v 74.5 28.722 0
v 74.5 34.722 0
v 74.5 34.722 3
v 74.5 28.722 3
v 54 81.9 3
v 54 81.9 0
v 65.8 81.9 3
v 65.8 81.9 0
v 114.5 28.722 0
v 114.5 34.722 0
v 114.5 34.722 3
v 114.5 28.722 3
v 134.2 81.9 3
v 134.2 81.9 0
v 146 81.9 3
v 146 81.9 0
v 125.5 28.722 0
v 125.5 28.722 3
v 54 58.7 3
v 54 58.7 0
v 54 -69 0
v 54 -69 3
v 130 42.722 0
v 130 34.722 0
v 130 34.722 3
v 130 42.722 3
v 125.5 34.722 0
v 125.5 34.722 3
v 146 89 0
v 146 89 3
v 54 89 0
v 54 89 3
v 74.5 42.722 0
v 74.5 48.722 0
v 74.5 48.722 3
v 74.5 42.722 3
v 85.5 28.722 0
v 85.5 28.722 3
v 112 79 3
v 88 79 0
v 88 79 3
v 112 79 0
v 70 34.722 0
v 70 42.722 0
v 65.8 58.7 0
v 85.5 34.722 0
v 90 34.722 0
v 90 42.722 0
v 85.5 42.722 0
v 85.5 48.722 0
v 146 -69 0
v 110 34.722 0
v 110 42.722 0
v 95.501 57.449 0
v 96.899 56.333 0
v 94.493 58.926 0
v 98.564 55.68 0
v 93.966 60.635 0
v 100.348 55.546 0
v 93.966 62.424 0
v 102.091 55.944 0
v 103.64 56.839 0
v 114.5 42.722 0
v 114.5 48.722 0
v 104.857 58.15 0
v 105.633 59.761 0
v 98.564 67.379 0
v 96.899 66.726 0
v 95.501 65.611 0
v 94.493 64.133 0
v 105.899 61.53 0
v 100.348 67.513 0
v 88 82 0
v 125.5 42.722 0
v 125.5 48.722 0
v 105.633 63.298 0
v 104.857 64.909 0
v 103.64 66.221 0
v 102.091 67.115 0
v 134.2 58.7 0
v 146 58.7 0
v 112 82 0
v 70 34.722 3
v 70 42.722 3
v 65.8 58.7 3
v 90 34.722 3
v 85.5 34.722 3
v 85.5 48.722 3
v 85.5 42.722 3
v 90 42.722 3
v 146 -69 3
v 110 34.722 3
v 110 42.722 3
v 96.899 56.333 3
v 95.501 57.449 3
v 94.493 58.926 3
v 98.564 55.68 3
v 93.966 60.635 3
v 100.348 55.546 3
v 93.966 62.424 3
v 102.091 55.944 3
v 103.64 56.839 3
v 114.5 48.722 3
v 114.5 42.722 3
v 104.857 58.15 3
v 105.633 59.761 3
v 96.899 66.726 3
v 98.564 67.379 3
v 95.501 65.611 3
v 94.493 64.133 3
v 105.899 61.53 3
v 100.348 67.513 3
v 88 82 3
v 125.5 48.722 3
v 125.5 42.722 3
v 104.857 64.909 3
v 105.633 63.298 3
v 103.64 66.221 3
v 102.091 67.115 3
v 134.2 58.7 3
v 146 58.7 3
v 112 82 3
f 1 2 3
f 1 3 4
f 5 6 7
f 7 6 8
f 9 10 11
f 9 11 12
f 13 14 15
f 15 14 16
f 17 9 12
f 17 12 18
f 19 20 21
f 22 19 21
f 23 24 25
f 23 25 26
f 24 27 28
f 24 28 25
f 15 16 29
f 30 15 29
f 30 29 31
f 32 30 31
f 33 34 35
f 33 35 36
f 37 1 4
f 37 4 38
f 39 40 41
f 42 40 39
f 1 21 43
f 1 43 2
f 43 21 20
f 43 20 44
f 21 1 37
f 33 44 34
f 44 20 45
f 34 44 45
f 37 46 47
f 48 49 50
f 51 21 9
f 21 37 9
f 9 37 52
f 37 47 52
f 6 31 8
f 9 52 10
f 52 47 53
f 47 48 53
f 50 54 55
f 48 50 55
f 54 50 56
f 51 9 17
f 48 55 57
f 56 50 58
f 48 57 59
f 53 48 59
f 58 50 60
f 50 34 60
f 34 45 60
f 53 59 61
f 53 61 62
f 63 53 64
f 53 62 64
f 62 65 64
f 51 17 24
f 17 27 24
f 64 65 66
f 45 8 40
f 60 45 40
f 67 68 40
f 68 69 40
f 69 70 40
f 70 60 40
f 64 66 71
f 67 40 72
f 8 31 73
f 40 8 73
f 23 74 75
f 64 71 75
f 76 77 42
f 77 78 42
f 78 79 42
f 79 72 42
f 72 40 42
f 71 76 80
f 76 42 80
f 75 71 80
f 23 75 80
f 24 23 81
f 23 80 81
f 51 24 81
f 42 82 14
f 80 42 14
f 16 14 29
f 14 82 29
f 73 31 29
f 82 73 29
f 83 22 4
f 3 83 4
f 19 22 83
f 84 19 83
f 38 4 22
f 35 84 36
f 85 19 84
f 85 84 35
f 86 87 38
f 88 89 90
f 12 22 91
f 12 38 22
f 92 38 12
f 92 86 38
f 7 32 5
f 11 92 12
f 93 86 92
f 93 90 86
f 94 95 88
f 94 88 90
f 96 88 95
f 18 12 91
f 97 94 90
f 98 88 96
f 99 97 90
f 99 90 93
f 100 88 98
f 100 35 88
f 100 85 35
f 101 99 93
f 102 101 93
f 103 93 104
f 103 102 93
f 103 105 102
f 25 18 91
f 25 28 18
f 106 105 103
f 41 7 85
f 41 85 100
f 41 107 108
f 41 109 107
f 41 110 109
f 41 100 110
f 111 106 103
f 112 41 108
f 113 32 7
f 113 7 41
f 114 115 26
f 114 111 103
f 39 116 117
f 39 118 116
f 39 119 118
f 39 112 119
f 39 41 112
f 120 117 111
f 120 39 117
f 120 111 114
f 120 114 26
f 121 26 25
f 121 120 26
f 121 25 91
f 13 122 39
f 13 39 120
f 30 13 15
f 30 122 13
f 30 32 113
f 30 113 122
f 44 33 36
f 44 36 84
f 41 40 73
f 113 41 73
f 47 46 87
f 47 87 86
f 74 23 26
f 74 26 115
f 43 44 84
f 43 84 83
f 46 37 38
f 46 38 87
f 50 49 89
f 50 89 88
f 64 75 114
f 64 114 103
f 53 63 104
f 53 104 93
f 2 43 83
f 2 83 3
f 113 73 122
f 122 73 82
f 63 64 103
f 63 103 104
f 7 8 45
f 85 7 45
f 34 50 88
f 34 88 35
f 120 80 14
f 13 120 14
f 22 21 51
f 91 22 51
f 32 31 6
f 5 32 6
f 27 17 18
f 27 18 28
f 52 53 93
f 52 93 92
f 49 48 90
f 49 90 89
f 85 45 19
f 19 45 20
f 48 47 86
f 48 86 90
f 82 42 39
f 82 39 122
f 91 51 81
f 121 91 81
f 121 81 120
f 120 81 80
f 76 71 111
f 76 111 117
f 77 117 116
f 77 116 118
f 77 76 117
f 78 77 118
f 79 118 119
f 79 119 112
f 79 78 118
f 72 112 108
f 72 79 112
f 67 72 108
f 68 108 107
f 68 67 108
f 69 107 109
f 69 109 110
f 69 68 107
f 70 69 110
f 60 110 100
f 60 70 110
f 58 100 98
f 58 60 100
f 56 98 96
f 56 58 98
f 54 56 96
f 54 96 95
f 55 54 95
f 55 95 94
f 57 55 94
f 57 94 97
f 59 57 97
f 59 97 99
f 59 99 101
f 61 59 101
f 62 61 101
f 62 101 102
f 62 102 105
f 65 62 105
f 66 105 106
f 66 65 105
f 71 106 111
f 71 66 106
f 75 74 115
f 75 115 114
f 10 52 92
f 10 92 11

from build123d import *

# Parameters (mm, degrees)
MODEL_R                 = 6
MODEL_W                 = 24
MODEL_H                 = 3
SALIENTE_EXTRUIR1_DEPTH = 3


with BuildPart() as part:
    # Model → Saliente-Extruir1 (new body)
    with BuildSketch(Plane.XY):
        Polygon((54, 89), (54, 81.9), (65.8, 81.9), (65.8, 58.7), (54, 58.7), (54, -69), (146, -69), (146, 58.7), (134.2, 58.7), (134.2, 81.9), (146, 81.9), (146, 89), align=None)
        with Locations((99.899304233, 61.529562992)):
            Circle(MODEL_R, mode=Mode.SUBTRACT)
        with Locations((100, 80.5)):
            Rectangle(MODEL_W, MODEL_H, mode=Mode.SUBTRACT)
        Polygon((85.5, 28.721585816), (85.5, 34.721585816), (90, 34.721585816), (90, 42.721585816), (85.5, 42.721585816), (85.5, 48.721585816), (74.5, 48.721585816), (74.5, 42.721585816), (70, 42.721585816), (70, 34.721585816), (74.5, 34.721585816), (74.5, 28.721585816), align=None, mode=Mode.SUBTRACT)
        Polygon((125.5, 28.721575199), (125.5, 34.721575199), (130, 34.721575199), (130, 42.721575199), (125.5, 42.721575199), (125.5, 48.721575199), (114.5, 48.721575199), (114.5, 42.721575199), (110, 42.721575199), (110, 34.721575199), (114.5, 34.721575199), (114.5, 28.721575199), align=None, mode=Mode.SUBTRACT)
    extrude(amount=SALIENTE_EXTRUIR1_DEPTH)


solid = part.part
